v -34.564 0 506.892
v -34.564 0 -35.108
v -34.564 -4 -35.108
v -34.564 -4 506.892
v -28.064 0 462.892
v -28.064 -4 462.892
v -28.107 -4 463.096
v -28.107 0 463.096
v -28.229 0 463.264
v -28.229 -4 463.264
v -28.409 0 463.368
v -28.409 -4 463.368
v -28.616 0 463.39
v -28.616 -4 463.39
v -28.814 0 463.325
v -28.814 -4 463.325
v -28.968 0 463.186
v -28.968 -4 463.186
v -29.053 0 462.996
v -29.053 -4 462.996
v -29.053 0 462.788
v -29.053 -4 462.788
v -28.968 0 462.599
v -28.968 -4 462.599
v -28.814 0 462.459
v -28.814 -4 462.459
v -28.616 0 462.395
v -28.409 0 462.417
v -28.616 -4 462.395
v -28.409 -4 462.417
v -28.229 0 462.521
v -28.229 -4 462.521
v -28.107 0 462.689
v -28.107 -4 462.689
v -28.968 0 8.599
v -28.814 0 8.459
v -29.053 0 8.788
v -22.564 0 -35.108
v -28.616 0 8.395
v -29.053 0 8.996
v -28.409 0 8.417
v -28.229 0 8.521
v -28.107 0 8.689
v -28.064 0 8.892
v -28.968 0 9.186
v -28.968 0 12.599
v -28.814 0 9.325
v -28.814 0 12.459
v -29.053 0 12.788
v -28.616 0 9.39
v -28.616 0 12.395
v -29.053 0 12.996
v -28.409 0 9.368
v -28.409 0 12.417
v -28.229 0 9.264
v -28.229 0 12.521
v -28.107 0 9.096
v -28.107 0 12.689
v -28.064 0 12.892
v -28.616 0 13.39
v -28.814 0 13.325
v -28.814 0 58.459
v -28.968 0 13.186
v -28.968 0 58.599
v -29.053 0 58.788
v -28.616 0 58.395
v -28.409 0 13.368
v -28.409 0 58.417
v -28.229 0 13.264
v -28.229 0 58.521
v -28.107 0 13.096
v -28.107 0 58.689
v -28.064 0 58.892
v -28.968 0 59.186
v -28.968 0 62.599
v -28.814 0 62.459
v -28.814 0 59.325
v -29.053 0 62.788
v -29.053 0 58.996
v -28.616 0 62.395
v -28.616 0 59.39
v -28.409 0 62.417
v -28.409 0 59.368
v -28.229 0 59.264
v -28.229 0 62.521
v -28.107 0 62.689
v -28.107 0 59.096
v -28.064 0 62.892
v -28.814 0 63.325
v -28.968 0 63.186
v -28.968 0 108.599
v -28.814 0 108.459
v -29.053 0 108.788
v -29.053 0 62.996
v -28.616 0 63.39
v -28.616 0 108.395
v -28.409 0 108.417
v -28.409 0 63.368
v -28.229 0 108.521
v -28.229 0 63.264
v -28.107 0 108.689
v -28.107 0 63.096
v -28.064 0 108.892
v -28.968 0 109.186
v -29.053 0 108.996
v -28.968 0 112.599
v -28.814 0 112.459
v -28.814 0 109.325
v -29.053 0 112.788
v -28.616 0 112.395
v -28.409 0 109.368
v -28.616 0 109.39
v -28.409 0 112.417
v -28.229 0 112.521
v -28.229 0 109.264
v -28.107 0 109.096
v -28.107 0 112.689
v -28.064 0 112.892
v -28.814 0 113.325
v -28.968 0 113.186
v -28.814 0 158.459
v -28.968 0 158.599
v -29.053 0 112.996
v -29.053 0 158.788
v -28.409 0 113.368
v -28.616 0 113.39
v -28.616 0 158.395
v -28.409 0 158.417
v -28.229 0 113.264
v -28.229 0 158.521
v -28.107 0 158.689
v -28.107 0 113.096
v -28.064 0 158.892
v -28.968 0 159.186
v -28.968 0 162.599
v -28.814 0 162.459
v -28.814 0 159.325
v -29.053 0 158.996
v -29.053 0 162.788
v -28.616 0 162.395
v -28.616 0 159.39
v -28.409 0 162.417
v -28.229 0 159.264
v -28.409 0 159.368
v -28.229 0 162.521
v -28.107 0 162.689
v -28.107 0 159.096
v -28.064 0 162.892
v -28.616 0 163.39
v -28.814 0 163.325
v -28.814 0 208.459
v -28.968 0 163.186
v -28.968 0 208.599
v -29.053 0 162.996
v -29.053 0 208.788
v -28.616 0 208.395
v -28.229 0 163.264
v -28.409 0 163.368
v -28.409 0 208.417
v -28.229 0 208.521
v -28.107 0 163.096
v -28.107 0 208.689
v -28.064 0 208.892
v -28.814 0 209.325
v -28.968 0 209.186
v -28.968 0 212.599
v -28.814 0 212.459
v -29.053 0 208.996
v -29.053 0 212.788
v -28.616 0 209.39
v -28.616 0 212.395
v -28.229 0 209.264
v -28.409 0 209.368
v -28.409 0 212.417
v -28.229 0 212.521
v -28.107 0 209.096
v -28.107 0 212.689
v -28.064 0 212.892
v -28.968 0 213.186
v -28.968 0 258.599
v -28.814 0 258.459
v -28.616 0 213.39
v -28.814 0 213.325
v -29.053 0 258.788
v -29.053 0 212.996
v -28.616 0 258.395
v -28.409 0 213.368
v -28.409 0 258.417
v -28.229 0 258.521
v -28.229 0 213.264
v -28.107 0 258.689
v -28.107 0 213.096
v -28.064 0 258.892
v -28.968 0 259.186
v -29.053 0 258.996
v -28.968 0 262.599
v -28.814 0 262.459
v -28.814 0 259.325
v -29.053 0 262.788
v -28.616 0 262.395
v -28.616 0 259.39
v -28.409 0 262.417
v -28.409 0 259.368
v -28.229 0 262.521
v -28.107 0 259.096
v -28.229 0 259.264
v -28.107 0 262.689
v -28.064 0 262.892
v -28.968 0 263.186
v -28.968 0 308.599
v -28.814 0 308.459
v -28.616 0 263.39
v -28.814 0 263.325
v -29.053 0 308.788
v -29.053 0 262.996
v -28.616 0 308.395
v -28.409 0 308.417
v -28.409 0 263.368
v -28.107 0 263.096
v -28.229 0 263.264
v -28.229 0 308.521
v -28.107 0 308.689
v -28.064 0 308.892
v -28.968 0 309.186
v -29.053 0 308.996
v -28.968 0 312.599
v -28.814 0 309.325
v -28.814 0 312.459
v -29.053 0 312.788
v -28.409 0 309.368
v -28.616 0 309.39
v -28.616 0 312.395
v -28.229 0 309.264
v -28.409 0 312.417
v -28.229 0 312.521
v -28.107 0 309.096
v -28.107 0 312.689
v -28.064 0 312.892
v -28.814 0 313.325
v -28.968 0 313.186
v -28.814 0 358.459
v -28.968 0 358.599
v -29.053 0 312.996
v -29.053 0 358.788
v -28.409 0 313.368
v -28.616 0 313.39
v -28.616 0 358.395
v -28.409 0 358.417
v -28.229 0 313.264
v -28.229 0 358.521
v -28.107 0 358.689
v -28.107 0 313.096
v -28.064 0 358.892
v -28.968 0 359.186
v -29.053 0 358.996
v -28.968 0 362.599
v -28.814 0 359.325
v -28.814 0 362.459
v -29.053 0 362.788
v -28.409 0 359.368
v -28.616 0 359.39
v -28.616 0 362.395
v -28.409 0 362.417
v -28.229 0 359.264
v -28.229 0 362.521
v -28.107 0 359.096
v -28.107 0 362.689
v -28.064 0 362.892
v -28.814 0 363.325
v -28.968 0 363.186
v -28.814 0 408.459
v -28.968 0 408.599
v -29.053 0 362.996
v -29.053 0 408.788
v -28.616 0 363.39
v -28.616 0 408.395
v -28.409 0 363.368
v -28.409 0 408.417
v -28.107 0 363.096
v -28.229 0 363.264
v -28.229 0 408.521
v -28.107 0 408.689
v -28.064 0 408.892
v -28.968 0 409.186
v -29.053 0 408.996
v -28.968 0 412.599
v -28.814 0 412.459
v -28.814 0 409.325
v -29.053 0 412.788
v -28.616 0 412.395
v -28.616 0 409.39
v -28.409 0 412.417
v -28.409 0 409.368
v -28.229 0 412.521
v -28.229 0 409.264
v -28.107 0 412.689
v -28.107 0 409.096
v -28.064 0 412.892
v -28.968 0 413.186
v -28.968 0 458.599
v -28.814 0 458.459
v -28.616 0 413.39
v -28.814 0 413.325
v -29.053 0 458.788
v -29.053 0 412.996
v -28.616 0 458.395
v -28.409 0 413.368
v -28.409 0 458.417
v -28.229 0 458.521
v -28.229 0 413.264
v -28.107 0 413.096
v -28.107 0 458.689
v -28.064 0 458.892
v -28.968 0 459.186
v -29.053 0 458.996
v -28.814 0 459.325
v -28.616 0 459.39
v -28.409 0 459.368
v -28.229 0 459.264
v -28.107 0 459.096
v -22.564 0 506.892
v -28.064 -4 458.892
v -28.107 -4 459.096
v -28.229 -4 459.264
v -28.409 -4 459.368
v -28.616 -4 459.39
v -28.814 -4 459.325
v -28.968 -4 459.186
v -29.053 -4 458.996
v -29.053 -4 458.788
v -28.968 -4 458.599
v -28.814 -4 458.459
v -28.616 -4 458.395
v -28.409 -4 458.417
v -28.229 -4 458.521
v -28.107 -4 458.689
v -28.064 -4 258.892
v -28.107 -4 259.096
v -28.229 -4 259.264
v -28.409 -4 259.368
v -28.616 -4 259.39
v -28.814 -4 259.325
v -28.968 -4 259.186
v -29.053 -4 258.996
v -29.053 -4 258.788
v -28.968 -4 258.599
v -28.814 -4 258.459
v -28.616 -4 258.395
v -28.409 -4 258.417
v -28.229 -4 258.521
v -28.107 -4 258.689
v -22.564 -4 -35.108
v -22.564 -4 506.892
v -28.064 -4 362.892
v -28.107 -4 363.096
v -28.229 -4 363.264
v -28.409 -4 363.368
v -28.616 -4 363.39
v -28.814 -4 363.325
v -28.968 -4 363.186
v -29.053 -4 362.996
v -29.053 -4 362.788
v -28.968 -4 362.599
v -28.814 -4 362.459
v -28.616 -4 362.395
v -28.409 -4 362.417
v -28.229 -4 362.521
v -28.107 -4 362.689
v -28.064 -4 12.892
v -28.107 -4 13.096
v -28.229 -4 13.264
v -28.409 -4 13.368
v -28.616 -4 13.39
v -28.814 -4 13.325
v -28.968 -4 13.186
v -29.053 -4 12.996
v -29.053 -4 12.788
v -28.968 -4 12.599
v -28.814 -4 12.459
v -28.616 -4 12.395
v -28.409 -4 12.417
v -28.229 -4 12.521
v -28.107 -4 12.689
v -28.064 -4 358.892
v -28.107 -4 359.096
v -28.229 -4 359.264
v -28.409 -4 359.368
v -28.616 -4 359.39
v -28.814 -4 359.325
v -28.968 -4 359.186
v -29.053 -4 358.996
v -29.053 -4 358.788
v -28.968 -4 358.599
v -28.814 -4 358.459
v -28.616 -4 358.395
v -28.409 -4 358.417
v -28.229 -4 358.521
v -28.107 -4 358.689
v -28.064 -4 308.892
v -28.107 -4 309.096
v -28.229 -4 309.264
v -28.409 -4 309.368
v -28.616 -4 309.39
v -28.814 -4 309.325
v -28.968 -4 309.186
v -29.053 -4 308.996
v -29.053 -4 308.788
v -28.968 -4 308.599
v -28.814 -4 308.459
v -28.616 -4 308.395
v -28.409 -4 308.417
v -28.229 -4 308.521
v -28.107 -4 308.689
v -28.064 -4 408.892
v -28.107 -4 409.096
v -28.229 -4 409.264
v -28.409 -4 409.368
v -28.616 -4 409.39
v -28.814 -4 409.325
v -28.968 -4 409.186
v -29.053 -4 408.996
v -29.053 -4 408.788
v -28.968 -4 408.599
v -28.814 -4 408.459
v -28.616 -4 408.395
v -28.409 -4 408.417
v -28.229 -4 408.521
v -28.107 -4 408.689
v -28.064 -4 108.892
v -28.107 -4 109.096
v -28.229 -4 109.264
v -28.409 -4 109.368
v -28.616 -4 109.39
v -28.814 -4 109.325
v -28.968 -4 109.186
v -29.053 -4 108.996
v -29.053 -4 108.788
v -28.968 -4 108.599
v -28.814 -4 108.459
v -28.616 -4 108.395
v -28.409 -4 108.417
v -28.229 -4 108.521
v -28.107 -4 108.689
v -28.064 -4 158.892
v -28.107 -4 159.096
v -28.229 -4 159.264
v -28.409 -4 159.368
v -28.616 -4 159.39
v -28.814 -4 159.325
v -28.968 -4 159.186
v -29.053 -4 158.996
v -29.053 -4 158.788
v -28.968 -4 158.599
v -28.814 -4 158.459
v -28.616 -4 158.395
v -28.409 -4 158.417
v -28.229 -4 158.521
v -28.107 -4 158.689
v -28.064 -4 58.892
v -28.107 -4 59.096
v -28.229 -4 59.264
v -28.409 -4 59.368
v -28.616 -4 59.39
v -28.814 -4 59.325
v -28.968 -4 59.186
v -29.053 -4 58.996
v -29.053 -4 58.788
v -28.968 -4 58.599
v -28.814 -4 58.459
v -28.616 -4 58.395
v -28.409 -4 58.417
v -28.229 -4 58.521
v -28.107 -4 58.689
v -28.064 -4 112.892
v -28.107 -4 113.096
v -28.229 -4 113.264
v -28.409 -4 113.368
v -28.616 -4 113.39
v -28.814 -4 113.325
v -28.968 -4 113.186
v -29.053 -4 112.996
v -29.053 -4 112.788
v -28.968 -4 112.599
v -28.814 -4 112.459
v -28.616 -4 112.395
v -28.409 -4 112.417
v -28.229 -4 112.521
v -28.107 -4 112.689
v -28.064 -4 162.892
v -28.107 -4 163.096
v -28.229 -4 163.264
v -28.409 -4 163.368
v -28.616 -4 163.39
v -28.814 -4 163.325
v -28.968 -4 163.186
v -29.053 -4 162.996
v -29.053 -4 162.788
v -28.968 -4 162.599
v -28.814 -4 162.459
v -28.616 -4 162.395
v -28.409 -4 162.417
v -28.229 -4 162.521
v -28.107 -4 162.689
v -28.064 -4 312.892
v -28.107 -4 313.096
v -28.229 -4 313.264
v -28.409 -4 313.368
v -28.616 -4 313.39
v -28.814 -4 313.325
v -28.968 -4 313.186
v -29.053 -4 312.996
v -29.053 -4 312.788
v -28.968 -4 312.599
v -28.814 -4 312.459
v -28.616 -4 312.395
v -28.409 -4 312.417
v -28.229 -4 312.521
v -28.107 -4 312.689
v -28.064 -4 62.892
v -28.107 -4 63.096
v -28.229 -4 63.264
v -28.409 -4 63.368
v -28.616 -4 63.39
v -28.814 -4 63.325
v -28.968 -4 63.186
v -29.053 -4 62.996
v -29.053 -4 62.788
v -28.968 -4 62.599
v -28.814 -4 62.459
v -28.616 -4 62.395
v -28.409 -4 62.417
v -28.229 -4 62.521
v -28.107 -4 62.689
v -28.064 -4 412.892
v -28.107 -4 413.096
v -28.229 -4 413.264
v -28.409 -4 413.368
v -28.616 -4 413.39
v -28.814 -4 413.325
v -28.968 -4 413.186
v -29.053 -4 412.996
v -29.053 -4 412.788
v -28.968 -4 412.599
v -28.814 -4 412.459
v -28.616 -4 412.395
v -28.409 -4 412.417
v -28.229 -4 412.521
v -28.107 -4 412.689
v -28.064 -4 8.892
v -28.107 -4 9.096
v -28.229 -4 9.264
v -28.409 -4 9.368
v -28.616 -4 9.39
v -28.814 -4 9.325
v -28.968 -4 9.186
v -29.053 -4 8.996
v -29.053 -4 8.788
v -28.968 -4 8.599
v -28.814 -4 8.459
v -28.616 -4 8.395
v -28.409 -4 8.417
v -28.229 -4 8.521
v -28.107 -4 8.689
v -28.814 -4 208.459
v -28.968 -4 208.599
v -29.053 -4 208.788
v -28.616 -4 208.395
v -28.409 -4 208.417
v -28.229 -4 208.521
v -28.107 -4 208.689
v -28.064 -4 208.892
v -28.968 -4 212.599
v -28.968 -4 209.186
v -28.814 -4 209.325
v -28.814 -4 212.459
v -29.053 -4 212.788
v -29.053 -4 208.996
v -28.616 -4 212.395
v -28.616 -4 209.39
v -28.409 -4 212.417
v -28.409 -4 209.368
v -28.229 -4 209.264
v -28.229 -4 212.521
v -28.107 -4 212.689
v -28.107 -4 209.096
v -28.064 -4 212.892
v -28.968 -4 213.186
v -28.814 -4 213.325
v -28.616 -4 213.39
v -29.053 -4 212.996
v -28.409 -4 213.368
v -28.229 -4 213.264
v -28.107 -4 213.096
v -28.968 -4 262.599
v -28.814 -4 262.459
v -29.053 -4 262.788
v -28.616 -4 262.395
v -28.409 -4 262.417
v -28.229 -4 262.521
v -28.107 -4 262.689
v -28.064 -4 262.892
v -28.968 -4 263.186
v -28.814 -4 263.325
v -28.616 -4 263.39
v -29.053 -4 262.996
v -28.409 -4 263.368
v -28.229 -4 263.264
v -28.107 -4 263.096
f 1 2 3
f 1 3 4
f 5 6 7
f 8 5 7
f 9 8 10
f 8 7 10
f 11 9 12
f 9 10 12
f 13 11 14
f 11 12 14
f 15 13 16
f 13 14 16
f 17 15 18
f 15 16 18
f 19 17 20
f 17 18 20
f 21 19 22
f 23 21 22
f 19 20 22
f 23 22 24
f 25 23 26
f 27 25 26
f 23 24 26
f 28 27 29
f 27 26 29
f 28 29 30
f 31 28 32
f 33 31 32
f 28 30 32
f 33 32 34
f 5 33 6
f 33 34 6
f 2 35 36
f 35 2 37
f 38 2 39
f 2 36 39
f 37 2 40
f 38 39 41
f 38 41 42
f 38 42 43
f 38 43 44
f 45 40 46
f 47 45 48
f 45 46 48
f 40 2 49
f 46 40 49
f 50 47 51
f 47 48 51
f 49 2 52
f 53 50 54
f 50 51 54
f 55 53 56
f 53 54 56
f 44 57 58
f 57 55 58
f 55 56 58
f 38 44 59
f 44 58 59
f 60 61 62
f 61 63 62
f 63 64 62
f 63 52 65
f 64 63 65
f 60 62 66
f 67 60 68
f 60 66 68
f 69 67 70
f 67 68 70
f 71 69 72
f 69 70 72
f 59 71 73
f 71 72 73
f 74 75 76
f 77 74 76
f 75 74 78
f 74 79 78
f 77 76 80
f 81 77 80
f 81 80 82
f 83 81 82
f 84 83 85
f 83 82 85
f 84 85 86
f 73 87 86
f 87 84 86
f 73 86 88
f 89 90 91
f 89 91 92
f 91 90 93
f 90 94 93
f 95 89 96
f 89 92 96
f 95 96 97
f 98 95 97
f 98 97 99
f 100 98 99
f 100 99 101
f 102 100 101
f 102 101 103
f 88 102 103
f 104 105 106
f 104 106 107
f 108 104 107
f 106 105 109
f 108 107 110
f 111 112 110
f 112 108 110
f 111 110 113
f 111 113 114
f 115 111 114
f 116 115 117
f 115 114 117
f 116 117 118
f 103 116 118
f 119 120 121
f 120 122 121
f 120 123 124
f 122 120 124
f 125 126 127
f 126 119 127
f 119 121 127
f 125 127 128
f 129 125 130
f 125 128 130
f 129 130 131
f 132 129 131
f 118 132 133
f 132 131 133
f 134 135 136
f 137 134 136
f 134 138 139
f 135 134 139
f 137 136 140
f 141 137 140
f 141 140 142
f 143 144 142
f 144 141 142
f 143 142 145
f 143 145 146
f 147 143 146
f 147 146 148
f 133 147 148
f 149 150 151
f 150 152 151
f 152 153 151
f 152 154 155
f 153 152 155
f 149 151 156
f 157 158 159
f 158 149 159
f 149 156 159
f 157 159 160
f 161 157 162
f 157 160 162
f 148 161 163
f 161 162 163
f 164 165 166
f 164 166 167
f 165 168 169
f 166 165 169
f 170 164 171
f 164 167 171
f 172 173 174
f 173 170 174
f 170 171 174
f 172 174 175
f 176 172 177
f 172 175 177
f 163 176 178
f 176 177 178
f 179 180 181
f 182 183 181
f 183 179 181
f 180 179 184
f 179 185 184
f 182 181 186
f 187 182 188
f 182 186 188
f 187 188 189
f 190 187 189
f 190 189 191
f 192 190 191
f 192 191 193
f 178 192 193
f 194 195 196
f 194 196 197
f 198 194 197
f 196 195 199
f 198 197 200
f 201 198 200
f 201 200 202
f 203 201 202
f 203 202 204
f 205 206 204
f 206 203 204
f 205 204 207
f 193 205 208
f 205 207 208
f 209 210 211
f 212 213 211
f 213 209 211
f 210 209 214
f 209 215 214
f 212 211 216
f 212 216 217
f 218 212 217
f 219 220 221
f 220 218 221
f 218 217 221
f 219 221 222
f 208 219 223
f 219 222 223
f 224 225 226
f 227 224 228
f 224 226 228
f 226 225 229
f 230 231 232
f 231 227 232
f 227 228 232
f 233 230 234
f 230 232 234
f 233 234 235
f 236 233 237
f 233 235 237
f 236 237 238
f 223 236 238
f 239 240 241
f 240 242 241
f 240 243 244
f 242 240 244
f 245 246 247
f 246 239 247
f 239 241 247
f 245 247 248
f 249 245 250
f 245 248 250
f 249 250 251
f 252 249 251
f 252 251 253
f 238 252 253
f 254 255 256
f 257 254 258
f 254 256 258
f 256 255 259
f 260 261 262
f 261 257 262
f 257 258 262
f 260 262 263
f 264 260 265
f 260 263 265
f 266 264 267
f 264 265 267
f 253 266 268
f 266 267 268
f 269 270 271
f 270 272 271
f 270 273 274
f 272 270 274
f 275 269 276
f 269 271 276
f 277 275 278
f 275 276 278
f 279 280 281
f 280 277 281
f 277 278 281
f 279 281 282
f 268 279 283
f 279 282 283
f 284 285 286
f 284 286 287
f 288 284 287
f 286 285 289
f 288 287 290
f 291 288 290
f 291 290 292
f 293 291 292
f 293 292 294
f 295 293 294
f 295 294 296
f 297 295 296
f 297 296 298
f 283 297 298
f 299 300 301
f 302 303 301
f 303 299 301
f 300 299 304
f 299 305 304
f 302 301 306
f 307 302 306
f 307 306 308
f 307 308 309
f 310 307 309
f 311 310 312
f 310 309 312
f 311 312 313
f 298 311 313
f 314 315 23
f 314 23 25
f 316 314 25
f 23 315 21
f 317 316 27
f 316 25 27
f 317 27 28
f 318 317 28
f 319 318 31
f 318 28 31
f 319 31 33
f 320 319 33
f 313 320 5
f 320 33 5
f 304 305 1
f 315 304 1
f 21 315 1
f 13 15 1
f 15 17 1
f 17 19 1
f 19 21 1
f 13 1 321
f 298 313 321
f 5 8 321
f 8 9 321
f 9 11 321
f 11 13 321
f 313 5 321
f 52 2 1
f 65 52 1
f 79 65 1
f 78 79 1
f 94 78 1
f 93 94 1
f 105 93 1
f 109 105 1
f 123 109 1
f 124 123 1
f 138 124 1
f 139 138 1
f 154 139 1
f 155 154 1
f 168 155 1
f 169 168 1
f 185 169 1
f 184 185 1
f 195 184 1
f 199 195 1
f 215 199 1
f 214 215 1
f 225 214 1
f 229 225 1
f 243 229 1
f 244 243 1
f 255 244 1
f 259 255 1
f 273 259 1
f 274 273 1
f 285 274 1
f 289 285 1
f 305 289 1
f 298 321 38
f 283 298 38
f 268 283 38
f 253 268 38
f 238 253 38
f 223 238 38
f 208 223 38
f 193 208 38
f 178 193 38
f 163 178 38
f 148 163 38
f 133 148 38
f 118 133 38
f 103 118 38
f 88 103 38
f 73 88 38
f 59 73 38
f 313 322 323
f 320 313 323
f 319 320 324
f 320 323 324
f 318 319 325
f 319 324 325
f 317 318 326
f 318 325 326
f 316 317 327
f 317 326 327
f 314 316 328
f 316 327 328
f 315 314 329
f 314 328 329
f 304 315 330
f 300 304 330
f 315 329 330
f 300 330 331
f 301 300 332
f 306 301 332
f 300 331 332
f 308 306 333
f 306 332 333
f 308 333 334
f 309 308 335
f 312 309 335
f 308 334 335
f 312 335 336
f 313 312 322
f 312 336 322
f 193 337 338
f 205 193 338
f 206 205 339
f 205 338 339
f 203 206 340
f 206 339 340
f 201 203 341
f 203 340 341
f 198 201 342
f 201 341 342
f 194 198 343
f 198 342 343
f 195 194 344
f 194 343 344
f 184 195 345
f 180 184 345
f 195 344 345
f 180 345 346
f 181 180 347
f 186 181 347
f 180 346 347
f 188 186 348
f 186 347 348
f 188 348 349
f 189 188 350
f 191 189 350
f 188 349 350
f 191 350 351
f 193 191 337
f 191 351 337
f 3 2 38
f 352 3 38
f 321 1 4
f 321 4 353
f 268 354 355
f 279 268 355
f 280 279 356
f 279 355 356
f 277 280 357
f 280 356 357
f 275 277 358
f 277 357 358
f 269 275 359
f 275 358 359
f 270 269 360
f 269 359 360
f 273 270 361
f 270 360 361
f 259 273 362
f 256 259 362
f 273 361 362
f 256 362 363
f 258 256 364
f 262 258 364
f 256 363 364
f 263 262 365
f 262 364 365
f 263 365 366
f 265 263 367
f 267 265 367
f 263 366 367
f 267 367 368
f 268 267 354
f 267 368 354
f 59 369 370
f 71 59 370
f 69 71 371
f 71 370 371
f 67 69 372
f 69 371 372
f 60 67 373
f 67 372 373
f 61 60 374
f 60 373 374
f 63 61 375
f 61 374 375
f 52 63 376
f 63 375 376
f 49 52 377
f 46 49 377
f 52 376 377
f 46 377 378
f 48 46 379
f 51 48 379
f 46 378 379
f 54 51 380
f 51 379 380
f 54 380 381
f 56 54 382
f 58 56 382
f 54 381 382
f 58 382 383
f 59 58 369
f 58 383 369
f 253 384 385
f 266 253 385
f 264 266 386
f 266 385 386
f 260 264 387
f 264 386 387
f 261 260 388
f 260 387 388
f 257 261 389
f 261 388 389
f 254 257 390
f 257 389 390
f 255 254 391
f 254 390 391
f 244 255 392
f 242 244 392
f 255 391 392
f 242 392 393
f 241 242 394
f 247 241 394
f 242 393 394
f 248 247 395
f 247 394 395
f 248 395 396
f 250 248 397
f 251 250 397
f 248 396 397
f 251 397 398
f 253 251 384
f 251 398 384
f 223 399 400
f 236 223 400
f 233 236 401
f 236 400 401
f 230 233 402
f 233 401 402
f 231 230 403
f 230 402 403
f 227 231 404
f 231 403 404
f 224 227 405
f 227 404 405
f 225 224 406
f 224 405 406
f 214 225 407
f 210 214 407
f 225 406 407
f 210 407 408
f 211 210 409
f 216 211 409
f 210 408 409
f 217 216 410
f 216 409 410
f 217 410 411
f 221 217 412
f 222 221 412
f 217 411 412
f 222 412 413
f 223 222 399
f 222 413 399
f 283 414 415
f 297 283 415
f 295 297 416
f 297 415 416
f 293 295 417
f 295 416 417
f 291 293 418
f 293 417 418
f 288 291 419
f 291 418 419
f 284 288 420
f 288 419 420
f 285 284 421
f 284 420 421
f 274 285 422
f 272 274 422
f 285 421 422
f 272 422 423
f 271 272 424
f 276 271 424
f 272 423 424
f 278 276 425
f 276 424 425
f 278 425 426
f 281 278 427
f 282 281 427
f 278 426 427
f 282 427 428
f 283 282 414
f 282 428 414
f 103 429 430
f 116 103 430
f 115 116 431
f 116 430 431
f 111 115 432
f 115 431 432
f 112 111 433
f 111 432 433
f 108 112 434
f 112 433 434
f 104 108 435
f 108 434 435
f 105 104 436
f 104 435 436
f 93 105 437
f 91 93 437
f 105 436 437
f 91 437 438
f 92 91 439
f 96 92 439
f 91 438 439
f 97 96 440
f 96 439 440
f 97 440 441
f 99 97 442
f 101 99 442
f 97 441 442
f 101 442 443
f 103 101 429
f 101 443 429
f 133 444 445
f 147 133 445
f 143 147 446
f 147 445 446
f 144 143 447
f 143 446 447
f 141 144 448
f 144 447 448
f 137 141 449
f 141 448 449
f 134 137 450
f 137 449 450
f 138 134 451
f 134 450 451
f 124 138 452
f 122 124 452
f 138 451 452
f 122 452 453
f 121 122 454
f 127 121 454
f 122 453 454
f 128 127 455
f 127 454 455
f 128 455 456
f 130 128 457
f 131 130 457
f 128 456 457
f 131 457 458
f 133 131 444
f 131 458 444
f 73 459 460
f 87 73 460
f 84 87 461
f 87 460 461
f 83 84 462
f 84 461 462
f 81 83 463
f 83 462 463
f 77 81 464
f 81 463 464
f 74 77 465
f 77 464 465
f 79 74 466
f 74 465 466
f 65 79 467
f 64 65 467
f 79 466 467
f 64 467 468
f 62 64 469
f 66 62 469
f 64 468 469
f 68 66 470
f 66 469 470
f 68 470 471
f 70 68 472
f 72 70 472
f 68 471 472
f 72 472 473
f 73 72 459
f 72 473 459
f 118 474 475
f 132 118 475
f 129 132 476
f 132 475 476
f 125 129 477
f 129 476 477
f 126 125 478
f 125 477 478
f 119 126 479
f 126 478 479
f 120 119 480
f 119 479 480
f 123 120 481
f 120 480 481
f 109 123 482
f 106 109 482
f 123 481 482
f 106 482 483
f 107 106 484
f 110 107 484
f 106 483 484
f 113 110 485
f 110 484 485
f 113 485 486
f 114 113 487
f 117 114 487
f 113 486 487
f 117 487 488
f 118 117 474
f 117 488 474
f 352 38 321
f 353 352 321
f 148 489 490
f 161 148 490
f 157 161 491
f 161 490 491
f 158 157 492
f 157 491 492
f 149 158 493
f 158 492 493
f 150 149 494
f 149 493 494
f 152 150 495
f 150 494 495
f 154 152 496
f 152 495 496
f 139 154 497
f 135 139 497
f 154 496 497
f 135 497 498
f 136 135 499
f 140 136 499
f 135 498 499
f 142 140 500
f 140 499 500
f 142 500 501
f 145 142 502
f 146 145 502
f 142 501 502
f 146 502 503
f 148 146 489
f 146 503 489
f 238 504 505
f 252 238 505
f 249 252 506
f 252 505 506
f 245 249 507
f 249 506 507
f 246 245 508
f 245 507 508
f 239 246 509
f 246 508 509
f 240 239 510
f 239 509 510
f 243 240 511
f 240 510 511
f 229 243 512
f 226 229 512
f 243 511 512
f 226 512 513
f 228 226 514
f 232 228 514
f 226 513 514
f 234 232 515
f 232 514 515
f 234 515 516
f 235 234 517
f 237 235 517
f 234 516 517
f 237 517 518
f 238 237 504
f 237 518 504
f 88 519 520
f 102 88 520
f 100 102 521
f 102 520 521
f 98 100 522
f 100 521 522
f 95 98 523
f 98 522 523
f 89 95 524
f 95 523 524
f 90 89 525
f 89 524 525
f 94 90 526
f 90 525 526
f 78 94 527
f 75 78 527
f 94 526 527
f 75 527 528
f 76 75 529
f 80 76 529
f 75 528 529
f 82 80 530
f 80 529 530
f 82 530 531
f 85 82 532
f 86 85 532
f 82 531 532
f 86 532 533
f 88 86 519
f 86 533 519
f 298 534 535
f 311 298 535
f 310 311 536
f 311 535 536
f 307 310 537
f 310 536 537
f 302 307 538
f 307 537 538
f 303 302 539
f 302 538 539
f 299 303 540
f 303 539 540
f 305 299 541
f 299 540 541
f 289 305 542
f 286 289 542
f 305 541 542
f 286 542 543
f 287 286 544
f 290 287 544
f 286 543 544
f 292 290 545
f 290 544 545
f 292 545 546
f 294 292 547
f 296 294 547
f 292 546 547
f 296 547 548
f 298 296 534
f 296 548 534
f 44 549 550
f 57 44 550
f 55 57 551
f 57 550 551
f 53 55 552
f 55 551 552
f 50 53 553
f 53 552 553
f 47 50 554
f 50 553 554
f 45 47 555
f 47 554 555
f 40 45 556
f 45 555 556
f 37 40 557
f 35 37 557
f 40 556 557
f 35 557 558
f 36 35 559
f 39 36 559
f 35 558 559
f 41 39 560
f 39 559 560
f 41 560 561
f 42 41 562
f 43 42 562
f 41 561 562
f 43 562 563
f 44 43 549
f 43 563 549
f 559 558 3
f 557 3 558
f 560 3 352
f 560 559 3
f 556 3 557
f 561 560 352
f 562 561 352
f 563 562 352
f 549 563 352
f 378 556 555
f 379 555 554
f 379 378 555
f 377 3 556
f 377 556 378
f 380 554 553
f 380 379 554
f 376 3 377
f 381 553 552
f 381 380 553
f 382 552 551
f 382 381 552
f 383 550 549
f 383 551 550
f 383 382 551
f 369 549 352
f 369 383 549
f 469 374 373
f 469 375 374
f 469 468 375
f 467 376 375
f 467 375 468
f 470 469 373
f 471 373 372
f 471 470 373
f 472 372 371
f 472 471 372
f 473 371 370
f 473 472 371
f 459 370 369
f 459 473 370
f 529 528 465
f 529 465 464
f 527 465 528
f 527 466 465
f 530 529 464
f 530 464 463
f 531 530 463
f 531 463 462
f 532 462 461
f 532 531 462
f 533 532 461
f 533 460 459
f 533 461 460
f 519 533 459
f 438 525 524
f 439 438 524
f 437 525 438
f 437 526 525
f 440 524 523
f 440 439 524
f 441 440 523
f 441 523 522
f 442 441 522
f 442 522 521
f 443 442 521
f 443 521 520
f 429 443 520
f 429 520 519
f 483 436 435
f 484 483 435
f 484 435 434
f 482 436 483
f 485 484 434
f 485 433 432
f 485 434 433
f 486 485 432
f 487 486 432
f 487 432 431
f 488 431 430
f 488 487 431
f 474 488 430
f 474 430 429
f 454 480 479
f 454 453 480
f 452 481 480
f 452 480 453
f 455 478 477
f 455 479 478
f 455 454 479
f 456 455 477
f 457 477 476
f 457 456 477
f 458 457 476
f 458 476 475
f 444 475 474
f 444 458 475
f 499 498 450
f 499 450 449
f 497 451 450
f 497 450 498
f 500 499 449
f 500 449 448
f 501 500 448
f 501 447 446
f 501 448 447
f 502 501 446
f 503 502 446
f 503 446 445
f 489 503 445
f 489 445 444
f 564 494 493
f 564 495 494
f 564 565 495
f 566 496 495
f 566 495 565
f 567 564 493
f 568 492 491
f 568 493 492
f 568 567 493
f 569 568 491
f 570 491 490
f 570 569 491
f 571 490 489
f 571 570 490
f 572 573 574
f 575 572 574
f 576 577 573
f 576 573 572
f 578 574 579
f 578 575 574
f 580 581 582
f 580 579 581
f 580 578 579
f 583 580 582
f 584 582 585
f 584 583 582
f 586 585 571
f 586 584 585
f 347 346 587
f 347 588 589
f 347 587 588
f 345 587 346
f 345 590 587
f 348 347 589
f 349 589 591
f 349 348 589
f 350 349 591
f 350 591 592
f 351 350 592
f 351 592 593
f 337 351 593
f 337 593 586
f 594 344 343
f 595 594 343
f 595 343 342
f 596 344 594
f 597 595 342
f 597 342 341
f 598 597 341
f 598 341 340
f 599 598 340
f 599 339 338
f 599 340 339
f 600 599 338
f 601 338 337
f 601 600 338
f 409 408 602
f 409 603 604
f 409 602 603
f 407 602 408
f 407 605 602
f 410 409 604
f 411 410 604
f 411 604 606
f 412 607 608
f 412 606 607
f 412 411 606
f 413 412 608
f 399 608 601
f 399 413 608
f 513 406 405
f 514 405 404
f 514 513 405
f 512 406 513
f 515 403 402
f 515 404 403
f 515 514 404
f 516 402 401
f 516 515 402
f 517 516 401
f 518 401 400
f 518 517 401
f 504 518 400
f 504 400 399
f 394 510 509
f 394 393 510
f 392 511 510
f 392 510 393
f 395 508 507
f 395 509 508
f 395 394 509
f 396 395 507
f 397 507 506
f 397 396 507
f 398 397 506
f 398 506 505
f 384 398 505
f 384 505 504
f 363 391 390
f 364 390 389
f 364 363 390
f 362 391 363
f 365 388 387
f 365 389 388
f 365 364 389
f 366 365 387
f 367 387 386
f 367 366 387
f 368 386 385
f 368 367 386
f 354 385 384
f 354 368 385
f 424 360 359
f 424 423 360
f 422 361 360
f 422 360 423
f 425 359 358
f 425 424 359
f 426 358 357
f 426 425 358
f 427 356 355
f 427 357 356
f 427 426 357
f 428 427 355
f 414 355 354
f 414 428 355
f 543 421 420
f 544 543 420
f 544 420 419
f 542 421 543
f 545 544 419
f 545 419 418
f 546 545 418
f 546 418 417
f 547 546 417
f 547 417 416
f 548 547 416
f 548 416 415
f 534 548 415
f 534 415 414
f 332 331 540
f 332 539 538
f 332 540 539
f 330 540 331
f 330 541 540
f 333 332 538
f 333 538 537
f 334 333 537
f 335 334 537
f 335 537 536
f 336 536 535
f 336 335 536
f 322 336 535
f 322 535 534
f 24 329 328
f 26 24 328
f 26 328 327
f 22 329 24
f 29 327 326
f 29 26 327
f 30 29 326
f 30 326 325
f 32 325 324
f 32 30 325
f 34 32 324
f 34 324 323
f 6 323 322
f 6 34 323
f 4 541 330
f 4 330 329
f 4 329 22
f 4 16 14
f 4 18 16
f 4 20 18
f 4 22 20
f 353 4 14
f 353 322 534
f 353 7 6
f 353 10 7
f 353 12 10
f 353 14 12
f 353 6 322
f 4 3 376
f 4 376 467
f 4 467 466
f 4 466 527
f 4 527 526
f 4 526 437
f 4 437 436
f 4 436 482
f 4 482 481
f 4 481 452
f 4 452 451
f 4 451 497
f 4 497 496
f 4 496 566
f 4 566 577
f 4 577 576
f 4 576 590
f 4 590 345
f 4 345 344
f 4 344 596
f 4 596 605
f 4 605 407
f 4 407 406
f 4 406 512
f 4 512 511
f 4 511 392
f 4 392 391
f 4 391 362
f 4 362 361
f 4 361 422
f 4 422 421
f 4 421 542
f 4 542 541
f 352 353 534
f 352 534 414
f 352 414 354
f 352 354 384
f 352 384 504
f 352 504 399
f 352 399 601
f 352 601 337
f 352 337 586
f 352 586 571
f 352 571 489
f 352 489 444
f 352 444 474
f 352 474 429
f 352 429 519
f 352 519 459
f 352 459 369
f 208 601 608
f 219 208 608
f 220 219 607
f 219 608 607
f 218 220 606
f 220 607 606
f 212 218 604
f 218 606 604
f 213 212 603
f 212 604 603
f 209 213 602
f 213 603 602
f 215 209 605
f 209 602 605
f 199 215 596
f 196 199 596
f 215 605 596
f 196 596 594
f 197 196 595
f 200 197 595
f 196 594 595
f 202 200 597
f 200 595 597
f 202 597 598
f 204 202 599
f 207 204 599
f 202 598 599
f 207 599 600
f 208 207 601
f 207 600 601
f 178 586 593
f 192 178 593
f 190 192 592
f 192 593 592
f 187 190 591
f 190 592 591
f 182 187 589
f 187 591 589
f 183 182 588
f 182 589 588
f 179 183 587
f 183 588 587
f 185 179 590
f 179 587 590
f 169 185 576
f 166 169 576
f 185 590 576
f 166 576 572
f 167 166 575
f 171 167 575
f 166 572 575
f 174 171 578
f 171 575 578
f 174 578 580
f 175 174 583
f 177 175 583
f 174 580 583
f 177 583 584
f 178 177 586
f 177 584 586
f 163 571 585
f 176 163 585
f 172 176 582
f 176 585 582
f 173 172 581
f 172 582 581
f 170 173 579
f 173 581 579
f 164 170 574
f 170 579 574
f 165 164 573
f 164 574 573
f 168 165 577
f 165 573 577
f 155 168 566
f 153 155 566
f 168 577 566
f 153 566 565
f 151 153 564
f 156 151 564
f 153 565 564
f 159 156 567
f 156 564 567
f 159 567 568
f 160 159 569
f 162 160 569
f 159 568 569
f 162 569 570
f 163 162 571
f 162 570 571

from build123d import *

# Parameters (mm, degrees)
F0_W     = 12
F0_H     = 542
F1_DEPTH = 4
F2_R     = 0.5
F3_DEPTH = 25


with BuildPart() as f1:
    # F0 (on Front) → F1 (new body)
    with BuildSketch(Plane.XZ):
        with Locations((-28.563729, 235.892393)):
            Rectangle(F0_W, F0_H)
    extrude(amount=F1_DEPTH)

    # F2 (on face) → F3 (cut)
    with BuildSketch(Plane.XZ.offset(4)):
        with Locations((-28.563729, 462.892393)):
            Circle(F2_R)
        with Locations((-28.563729, 458.892393)):
            Circle(F2_R)
        with Locations((-28.563729, 412.892393)):
            Circle(F2_R)
        with Locations((-28.563729, 408.892393)):
            Circle(F2_R)
        with Locations((-28.563729, 362.892393)):
            Circle(F2_R)
        with Locations((-28.563729, 358.892393)):
            Circle(F2_R)
        with Locations((-28.563729, 312.892393)):
            Circle(F2_R)
        with Locations((-28.563729, 308.892393)):
            Circle(F2_R)
        with Locations((-28.563729, 262.892393)):
            Circle(F2_R)
        with Locations((-28.563729, 258.892393)):
            Circle(F2_R)
        with Locations((-28.563729, 212.892393)):
            Circle(F2_R)
        with Locations((-28.563729, 208.892393)):
            Circle(F2_R)
        with Locations((-28.563729, 162.892393)):
            Circle(F2_R)
        with Locations((-28.563729, 158.892393)):
            Circle(F2_R)
        with Locations((-28.563729, 112.892393)):
            Circle(F2_R)
        with Locations((-28.563729, 108.892393)):
            Circle(F2_R)
        with Locations((-28.563729, 62.892393)):
            Circle(F2_R)
        with Locations((-28.563729, 58.892393)):
            Circle(F2_R)
        with Locations((-28.563729, 12.892393)):
            Circle(F2_R)
        with Locations((-28.563729, 8.892393)):
            Circle(F2_R)
        with Locations((-3.563729, 462.892393)):
            Circle(F2_R)
        with Locations((-3.563729, 458.892393)):
            Circle(F2_R)
        with Locations((-3.563729, 412.892393)):
            Circle(F2_R)
        with Locations((-3.563729, 408.892393)):
            Circle(F2_R)
        with Locations((-3.563729, 362.892393)):
            Circle(F2_R)
        with Locations((-3.563729, 358.892393)):
            Circle(F2_R)
        with Locations((-3.563729, 312.892393)):
            Circle(F2_R)
        with Locations((-3.563729, 308.892393)):
            Circle(F2_R)
        with Locations((-3.563729, 262.892393)):
            Circle(F2_R)
        with Locations((-3.563729, 258.892393)):
            Circle(F2_R)
        with Locations((-3.563729, 212.892393)):
            Circle(F2_R)
        with Locations((-3.563729, 208.892393)):
            Circle(F2_R)
        with Locations((-3.563729, 162.892393)):
            Circle(F2_R)
        with Locations((-3.563729, 158.892393)):
            Circle(F2_R)
        with Locations((-3.563729, 112.892393)):
            Circle(F2_R)
        with Locations((-3.563729, 108.892393)):
            Circle(F2_R)
        with Locations((-3.563729, 62.892393)):
            Circle(F2_R)
        with Locations((-3.563729, 58.892393)):
            Circle(F2_R)
        with Locations((-3.563729, 12.892393)):
            Circle(F2_R)
        with Locations((-3.563729, 8.892393)):
            Circle(F2_R)
        with Locations((21.436271, 462.892393)):
            Circle(F2_R)
        with Locations((21.436271, 458.892393)):
            Circle(F2_R)
        with Locations((21.436271, 412.892393)):
            Circle(F2_R)
        with Locations((21.436271, 408.892393)):
            Circle(F2_R)
        with Locations((21.436271, 362.892393)):
            Circle(F2_R)
        with Locations((21.436271, 358.892393)):
            Circle(F2_R)
        with Locations((21.436271, 312.892393)):
            Circle(F2_R)
        with Locations((21.436271, 308.892393)):
            Circle(F2_R)
        with Locations((21.436271, 262.892393)):
            Circle(F2_R)
        with Locations((21.436271, 258.892393)):
            Circle(F2_R)
        with Locations((21.436271, 212.892393)):
            Circle(F2_R)
        with Locations((21.436271, 208.892393)):
            Circle(F2_R)
        with Locations((21.436271, 162.892393)):
            Circle(F2_R)
        with Locations((21.436271, 158.892393)):
            Circle(F2_R)
        with Locations((21.436271, 112.892393)):
            Circle(F2_R)
        with Locations((21.436271, 108.892393)):
            Circle(F2_R)
        with Locations((21.436271, 62.892393)):
            Circle(F2_R)
        with Locations((21.436271, 58.892393)):
            Circle(F2_R)
        with Locations((21.436271, 12.892393)):
            Circle(F2_R)
        with Locations((21.436271, 8.892393)):
            Circle(F2_R)
    extrude(amount=-F3_DEPTH, mode=Mode.SUBTRACT)


solid = f1.part
